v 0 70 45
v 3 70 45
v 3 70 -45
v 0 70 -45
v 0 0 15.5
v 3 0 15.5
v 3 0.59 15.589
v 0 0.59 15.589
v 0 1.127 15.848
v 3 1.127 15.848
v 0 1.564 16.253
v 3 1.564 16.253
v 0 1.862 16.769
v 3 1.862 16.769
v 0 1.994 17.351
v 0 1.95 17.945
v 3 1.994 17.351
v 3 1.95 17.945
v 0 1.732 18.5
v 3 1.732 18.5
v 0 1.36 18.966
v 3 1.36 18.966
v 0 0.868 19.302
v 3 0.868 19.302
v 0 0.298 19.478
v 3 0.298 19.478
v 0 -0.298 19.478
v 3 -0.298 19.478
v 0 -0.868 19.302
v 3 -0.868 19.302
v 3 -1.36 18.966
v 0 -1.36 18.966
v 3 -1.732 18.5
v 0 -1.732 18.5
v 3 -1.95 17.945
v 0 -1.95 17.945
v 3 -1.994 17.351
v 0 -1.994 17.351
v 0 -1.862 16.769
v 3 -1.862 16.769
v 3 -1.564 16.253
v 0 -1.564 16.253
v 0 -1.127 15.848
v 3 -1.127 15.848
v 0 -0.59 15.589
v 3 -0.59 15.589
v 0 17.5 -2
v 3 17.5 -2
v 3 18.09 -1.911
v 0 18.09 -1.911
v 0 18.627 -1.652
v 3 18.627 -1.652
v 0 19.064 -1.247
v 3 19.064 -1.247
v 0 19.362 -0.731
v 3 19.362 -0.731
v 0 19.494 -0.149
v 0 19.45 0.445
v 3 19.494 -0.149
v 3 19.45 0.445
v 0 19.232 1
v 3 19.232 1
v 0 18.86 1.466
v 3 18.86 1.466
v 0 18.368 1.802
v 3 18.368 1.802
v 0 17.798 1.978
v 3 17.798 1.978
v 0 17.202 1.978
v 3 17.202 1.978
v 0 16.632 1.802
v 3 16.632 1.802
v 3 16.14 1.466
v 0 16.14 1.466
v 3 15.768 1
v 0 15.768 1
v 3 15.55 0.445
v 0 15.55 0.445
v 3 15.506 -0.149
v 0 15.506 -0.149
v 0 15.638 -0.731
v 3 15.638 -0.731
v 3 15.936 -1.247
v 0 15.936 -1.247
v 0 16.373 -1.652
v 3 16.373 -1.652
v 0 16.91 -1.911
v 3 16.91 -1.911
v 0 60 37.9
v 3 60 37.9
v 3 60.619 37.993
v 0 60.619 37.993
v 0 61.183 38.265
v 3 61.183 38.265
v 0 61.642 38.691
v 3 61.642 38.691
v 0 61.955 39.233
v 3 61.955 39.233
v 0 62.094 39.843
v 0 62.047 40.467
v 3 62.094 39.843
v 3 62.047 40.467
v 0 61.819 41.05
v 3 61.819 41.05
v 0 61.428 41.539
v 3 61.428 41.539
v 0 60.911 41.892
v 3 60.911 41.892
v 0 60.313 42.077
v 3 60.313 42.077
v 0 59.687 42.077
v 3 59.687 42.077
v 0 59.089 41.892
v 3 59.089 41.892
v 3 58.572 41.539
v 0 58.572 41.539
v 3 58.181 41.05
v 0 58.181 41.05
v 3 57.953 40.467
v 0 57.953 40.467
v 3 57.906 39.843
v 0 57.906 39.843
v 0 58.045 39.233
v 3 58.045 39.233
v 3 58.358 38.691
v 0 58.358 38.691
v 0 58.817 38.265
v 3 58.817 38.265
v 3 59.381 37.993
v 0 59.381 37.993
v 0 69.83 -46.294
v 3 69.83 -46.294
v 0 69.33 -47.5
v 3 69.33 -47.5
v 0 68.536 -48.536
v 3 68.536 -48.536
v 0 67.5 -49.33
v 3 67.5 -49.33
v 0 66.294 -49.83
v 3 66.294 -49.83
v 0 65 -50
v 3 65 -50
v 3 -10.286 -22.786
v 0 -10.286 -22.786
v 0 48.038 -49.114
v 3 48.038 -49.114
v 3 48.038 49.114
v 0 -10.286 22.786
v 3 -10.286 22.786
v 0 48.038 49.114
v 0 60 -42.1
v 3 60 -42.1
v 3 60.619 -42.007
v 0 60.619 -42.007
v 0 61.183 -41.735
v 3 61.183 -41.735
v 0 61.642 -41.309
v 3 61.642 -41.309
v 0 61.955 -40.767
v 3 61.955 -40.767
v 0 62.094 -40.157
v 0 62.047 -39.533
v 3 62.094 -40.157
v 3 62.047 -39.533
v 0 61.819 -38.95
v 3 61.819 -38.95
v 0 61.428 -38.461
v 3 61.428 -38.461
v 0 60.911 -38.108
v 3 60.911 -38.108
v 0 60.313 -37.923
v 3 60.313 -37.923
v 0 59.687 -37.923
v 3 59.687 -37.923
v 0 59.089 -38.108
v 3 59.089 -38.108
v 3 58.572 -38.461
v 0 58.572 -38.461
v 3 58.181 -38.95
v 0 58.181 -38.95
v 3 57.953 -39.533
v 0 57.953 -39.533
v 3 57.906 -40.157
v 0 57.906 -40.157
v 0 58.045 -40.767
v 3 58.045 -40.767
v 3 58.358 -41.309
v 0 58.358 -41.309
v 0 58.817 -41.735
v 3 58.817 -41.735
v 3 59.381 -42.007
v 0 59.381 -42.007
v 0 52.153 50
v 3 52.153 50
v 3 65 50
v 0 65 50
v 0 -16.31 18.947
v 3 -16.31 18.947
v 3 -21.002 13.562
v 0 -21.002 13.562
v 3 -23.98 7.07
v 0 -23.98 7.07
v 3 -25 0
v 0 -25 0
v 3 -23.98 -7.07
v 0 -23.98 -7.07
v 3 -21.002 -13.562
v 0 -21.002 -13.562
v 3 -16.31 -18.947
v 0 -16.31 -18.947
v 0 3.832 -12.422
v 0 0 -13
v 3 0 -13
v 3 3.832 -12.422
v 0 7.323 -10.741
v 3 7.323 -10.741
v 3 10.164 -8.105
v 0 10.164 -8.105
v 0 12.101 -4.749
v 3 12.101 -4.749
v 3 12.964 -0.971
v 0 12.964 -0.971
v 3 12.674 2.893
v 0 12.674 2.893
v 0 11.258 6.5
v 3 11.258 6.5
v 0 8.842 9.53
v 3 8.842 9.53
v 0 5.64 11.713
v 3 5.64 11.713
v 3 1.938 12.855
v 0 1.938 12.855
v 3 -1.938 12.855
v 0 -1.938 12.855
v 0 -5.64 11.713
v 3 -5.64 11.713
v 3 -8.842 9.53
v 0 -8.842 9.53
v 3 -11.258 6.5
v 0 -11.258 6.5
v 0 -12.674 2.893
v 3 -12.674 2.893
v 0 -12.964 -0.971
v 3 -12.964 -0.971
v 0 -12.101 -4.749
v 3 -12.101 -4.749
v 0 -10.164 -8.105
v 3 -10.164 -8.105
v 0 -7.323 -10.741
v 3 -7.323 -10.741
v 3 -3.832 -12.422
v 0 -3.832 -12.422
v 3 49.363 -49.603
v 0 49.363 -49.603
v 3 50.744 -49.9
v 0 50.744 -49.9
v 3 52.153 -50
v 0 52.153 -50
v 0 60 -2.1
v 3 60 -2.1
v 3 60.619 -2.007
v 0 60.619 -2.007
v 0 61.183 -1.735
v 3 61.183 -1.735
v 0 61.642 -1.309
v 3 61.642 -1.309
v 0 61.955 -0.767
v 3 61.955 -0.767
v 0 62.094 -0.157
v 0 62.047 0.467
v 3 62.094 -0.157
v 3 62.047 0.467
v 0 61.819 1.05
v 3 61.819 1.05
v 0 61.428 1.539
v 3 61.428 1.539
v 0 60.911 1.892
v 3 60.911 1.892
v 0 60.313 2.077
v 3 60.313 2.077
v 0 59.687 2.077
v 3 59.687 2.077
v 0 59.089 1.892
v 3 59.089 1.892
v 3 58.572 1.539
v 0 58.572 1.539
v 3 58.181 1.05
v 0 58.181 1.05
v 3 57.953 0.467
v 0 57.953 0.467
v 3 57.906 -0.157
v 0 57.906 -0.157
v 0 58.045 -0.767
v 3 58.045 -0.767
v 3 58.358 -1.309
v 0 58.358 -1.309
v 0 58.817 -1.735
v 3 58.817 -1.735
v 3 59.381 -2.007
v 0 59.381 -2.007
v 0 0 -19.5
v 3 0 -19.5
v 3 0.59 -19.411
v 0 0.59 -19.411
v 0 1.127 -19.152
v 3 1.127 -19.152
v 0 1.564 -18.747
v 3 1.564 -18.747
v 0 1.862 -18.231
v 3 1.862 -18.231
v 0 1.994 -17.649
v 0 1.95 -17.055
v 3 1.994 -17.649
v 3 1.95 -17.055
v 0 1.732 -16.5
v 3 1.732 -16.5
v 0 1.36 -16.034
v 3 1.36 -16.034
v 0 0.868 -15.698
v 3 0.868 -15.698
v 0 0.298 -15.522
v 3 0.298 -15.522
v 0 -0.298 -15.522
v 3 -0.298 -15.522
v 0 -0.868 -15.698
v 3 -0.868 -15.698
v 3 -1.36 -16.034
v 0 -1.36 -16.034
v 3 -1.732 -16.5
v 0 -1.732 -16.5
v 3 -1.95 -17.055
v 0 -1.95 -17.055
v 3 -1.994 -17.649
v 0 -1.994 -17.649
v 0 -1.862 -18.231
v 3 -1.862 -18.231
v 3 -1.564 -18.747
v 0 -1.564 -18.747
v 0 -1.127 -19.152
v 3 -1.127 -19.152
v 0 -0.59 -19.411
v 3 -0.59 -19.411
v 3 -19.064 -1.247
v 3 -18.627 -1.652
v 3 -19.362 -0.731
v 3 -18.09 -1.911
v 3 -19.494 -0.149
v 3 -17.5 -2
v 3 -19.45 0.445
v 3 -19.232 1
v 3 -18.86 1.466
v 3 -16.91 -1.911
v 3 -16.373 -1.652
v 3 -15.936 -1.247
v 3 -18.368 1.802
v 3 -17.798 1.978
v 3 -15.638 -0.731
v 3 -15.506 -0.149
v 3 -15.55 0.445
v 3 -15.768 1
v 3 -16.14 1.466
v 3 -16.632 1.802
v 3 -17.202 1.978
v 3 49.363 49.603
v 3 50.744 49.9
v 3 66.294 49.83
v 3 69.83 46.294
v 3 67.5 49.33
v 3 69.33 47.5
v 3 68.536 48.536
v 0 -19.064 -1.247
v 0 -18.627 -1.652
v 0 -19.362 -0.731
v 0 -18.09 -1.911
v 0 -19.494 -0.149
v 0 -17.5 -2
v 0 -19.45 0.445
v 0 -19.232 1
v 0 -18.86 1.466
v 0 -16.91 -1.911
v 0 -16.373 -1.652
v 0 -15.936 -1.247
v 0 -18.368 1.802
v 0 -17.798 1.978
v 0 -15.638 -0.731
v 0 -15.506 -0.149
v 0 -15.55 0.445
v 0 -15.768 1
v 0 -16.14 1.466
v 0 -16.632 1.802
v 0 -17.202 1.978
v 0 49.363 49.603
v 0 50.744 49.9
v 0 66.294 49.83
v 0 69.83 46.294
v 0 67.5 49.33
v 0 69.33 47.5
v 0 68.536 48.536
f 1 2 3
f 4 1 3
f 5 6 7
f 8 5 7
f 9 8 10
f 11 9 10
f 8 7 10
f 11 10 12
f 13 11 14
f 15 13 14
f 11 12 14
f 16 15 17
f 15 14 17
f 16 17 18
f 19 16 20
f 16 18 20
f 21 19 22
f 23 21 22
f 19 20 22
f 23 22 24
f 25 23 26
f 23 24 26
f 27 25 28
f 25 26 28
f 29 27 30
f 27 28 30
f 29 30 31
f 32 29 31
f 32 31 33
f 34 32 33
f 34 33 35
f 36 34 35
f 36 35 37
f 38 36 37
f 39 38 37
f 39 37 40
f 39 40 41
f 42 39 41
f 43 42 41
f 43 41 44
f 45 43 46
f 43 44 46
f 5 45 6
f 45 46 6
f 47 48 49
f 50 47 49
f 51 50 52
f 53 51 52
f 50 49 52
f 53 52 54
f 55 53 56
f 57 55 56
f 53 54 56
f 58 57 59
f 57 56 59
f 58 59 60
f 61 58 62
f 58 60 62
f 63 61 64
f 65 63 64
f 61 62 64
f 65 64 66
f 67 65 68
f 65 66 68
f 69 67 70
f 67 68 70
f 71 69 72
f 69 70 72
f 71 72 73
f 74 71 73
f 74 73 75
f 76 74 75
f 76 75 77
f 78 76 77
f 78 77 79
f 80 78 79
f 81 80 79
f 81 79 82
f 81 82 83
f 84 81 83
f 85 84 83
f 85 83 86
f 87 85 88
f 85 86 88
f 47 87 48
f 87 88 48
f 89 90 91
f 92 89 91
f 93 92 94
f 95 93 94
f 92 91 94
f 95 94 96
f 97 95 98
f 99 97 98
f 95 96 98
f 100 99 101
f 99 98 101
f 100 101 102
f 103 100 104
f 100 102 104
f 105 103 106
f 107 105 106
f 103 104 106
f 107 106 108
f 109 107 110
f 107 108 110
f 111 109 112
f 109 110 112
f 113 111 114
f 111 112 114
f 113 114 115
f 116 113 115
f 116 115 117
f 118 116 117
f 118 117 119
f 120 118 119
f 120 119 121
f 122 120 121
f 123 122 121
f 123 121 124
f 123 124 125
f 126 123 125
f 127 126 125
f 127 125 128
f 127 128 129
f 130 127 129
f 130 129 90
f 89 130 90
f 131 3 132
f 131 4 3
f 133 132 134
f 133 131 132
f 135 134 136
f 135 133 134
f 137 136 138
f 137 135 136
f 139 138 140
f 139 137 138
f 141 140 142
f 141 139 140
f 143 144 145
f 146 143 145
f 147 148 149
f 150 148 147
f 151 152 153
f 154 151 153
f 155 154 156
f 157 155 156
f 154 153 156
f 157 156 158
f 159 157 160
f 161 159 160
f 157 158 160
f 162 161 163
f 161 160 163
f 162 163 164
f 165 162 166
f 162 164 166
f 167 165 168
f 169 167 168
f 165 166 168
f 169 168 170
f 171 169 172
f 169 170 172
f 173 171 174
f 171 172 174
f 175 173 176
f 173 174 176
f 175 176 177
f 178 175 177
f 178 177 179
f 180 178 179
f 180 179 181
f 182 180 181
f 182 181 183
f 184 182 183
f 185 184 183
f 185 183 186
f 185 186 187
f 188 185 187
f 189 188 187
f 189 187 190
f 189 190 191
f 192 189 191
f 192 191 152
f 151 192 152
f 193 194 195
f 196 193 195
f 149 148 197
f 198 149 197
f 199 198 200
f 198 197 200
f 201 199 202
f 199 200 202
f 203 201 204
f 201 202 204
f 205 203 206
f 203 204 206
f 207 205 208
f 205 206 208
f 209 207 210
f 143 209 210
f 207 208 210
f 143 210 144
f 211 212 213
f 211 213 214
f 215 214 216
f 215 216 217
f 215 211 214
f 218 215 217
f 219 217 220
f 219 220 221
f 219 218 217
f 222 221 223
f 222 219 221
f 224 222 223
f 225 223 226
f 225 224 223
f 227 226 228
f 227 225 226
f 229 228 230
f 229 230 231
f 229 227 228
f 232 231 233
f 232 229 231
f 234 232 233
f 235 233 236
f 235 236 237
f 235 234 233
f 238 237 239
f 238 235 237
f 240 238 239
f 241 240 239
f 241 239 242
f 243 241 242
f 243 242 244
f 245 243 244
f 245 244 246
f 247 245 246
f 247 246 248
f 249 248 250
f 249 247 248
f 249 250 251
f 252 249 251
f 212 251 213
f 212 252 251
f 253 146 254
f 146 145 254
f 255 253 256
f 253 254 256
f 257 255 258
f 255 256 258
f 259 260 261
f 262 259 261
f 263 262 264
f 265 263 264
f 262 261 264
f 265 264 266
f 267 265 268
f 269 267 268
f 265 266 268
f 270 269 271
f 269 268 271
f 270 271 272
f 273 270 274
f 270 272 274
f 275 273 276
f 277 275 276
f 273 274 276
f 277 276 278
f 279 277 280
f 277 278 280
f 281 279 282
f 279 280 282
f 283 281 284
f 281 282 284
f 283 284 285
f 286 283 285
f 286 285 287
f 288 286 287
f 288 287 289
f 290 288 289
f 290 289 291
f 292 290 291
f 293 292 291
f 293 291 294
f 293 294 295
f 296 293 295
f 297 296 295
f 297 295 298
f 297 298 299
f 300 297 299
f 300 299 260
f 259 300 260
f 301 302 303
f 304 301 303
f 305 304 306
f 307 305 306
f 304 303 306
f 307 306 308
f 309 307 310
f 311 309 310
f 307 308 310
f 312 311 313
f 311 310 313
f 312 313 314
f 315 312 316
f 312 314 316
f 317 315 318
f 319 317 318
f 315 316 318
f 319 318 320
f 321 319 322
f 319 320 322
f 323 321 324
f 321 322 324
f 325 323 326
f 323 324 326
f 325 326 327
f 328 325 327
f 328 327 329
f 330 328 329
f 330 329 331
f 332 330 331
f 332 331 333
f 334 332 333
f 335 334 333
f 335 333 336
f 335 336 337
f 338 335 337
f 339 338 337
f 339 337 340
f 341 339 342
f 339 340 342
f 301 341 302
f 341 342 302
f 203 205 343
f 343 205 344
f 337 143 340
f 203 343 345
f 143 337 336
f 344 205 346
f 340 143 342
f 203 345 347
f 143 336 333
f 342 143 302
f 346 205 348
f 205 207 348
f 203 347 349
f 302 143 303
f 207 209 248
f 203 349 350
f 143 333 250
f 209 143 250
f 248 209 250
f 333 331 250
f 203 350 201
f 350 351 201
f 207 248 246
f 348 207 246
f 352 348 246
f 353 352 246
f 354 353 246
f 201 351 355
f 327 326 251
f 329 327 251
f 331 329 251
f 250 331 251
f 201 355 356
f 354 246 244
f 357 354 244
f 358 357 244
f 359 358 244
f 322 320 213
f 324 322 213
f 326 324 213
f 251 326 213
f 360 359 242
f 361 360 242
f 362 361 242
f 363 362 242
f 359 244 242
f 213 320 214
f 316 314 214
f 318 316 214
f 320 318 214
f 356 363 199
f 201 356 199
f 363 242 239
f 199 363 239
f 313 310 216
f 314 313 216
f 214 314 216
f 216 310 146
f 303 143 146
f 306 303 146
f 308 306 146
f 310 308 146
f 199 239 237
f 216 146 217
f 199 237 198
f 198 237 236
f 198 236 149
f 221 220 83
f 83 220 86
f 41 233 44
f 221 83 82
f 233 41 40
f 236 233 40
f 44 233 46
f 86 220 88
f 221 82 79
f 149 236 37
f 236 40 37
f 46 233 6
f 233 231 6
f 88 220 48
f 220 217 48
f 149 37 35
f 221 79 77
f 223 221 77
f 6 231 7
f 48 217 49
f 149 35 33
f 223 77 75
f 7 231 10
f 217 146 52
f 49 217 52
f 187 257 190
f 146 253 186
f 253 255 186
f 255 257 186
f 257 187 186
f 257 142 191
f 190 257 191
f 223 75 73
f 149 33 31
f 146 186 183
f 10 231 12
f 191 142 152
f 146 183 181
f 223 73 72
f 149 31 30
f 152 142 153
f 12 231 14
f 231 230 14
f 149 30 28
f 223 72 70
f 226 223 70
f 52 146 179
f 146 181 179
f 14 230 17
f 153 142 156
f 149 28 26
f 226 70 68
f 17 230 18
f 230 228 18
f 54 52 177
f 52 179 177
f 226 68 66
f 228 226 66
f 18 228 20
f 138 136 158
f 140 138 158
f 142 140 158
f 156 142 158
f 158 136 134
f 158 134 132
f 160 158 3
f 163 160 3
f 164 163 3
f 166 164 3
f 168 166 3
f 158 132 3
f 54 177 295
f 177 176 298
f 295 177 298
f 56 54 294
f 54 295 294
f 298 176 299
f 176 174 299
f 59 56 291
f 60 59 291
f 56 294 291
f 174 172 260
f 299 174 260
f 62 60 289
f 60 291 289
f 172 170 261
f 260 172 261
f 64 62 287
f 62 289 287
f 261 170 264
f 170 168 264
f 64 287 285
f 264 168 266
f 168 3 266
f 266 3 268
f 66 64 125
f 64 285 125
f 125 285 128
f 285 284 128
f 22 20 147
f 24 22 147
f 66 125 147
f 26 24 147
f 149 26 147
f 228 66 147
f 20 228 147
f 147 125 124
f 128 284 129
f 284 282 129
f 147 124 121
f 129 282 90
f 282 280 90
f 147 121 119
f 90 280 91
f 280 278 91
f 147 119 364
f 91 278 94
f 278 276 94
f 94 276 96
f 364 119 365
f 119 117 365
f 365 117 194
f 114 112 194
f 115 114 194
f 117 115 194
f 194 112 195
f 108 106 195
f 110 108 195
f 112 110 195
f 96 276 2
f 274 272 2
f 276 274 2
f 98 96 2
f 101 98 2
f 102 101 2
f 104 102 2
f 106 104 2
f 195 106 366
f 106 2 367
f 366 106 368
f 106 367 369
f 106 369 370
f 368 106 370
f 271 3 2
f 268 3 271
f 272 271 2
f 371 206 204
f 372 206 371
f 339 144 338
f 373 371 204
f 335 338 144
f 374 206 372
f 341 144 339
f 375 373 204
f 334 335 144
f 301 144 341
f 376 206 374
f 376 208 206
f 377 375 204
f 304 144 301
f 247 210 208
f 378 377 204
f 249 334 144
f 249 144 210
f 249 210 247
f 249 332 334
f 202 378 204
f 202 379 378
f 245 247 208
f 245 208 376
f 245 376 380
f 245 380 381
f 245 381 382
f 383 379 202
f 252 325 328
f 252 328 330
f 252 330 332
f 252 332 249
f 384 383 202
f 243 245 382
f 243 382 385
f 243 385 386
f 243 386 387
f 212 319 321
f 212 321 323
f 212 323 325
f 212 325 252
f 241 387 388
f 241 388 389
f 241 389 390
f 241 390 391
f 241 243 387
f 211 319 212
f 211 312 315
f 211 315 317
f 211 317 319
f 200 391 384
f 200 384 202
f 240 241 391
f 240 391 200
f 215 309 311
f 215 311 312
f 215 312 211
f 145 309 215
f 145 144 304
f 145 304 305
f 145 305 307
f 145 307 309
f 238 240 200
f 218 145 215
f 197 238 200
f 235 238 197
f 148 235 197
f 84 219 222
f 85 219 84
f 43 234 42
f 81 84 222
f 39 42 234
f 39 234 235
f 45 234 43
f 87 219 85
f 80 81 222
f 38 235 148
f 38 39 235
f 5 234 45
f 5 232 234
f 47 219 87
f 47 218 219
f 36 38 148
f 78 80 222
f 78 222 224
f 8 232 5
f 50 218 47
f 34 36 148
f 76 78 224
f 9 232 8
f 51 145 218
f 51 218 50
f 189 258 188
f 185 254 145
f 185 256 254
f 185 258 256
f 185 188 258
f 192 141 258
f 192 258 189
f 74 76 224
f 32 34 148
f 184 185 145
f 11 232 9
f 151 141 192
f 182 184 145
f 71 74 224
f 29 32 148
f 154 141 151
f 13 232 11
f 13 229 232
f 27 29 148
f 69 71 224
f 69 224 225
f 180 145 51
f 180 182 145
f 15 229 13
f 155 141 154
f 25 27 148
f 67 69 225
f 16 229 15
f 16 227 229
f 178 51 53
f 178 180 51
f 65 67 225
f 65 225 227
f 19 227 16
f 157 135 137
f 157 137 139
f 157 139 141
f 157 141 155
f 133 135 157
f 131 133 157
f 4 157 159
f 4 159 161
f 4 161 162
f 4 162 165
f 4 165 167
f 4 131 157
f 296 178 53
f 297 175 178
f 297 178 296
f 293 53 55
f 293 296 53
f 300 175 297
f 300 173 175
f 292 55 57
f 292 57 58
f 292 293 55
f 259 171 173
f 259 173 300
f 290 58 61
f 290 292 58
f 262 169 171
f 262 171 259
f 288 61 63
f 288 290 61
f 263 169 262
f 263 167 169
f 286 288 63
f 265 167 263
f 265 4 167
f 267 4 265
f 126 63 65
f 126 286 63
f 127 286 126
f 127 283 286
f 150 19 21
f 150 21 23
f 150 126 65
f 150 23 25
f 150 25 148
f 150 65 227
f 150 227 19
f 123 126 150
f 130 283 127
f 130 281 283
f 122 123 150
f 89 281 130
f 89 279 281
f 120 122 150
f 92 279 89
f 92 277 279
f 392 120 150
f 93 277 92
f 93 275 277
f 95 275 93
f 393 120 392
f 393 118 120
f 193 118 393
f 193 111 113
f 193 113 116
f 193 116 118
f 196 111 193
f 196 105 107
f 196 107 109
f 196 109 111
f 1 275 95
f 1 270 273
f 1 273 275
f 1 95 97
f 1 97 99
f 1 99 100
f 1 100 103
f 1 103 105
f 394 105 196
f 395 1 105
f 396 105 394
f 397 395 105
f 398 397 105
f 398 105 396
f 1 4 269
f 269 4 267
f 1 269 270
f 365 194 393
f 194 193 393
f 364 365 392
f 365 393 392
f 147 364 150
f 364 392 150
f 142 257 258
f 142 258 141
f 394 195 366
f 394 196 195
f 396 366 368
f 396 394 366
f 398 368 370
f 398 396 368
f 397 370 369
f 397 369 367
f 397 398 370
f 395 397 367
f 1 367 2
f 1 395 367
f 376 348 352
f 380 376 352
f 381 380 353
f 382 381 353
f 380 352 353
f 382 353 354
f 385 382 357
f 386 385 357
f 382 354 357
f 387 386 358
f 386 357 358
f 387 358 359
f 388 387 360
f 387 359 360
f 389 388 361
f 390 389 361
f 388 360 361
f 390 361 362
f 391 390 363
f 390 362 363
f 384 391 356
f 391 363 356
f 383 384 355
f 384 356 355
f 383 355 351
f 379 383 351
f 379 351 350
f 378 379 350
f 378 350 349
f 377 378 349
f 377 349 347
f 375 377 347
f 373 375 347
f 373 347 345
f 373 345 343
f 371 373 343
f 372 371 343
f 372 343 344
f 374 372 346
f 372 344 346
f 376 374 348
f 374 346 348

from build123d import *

# Parameters (mm, degrees)
SKETCH_1_R          = 25
SKETCH_1_R_2        = 13
EXTRUDE_1_DEPTH     = 3
SKETCH_2_R          = 2
CUT_EXTRUDE_1_DEPTH = 3
EXTRUDE_START       = -3
EXTRUDE_2_DEPTH     = 3
SKETCH_4_W          = 100
SKETCH_4_H          = 20
EXTRUDE_3_DEPTH     = 3
EXTRUDE_4_DEPTH     = 3
SKETCH_6_R          = 2.1
CUT_EXTRUDE_2_DEPTH = 87.075548212
FILLET_1_R          = 5
FILLET_2_R          = 10


with BuildPart() as part:
    # 草图1 → 凸台-拉伸1 (new body)
    with BuildSketch(Plane(origin=(0, 0, 0), x_dir=(0, 0, -1), z_dir=(1, 0, 0))):
        Circle(SKETCH_1_R)
        Circle(SKETCH_1_R_2, mode=Mode.SUBTRACT)
    extrude(amount=EXTRUDE_1_DEPTH)

    # 草图2 → 切除-拉伸1 (cut)
    with BuildSketch(Plane(origin=(3, 0, 0), x_dir=(0, 0, -1), z_dir=(1, 0, 0))):
        with Locations((0, 17.5)):
            Circle(SKETCH_2_R)
        with Locations((17.5, 0)):
            Circle(SKETCH_2_R)
        with Locations((0, -17.5)):
            Circle(SKETCH_2_R)
        with Locations((-17.5, 0)):
            Circle(SKETCH_2_R)
    extrude(amount=-CUT_EXTRUDE_1_DEPTH, mode=Mode.SUBTRACT)

    # 草图3 → 凸台-拉伸2 (add)
    with BuildSketch(Plane(origin=(3, 0, 0), x_dir=(0, 0, -1), z_dir=(1, 0, 0)).offset(EXTRUDE_START)):
        with BuildLine():
            Line((-25, 0), (-25, 70))
            Line((-25, 70), (25, 70))
            Line((25, 70), (25, 0))
            ThreePointArc((25, 0), (0, 25), (-25, 0))
        make_face()
    extrude(amount=EXTRUDE_2_DEPTH)

    # 草图4 → 凸台-拉伸3 (add)
    with BuildSketch(Plane(origin=(3, 0, 0), x_dir=(0, 0, -1), z_dir=(1, 0, 0))):
        with Locations((0, 60)):
            Rectangle(SKETCH_4_W, SKETCH_4_H)
    extrude(amount=-EXTRUDE_3_DEPTH)

    # 草图5 → 凸台-拉伸4 (add)
    with BuildSketch(Plane(origin=(3, 0, 0), x_dir=(0, 0, -1), z_dir=(1, 0, 0)).offset(EXTRUDE_START)):
        with BuildLine():
            Line((-22.785945694, -10.285945694), (-50, 50))
            Line((-50, 50), (-25, 50))
            Line((-25, 50), (-25, 0))
            ThreePointArc((-25, 0), (-24.440219336, -5.260767893), (-22.785945694, -10.285945694))
        make_face()
        with BuildLine():
            Line((22.785945694, -10.285945694), (50, 50))
            Line((50, 50), (25, 50))
            Line((25, 50), (25, 0))
            ThreePointArc((25, 0), (24.440219336, -5.260767893), (22.785945694, -10.285945694))
        make_face()
    extrude(amount=EXTRUDE_4_DEPTH)

    # 草图6 → 切除-拉伸2 (cut, through all)
    with BuildSketch(Plane(origin=(3, 0, 0), x_dir=(0, 0, -1), z_dir=(1, 0, 0))):
        with Locations((-40, 60)):
            Circle(SKETCH_6_R)
        with Locations((0, 60)):
            Circle(SKETCH_6_R)
        with Locations((40, 60)):
            Circle(SKETCH_6_R)
    extrude(amount=-CUT_EXTRUDE_2_DEPTH, mode=Mode.SUBTRACT)

    # 圆角1
    fillet_1_edges = [part.edges().sort_by_distance(p)[0] for p in [
        (1.5, 70, 50),
        (1.5, 70, -50),
    ]]
    fillet(fillet_1_edges, radius=FILLET_1_R)

    # 圆角2
    fillet_2_edges = [part.edges().sort_by_distance(p)[0] for p in [
        (1.5, 50, 50),
        (1.5, 50, -50),
    ]]
    fillet(fillet_2_edges, radius=FILLET_2_R)


solid = part.part
